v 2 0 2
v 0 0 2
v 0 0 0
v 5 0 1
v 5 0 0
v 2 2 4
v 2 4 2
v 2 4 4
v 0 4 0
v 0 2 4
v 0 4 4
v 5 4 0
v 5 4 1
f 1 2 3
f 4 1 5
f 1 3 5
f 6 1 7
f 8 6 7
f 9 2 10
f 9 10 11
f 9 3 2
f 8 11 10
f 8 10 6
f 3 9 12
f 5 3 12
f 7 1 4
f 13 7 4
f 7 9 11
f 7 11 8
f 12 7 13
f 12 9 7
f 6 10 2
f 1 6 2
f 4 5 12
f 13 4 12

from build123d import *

# Parameters (mm, degrees)
F0_W     = 5
F0_H     = 4
F1_DEPTH = 2
F3_DEPTH = 25
F4_W     = 2
F4_H     = 4
F5_DEPTH = 2
F7_DEPTH = 25


with BuildPart() as f1:
    # F0 (on Top) → F1 (new body)
    with BuildSketch(Plane.XY):
        with Locations((2.5, 2)):
            Rectangle(F0_W, F0_H)
    extrude(amount=F1_DEPTH)

    # F2 (on face) → F3 (cut)
    with BuildSketch(Plane.XZ):
        Polygon((5, 1), (5, 2), (2, 2), align=None)
    extrude(amount=-F3_DEPTH, mode=Mode.SUBTRACT)

    # F4 (on face) → F5 (join)
    with BuildSketch(Plane.XY.offset(2)):
        with Locations((1, 2)):
            Rectangle(F4_W, F4_H)
    extrude(amount=F5_DEPTH)

    # F6 (on face) → F7 (cut)
    with BuildSketch(Plane(origin=(0, 0, 0), x_dir=(0, -1, 0), z_dir=(-1, 0, 0))):
        Polygon((0, 4), (-2, 4), (0, 2), align=None)
    extrude(amount=-F7_DEPTH, mode=Mode.SUBTRACT)


solid = f1.part
